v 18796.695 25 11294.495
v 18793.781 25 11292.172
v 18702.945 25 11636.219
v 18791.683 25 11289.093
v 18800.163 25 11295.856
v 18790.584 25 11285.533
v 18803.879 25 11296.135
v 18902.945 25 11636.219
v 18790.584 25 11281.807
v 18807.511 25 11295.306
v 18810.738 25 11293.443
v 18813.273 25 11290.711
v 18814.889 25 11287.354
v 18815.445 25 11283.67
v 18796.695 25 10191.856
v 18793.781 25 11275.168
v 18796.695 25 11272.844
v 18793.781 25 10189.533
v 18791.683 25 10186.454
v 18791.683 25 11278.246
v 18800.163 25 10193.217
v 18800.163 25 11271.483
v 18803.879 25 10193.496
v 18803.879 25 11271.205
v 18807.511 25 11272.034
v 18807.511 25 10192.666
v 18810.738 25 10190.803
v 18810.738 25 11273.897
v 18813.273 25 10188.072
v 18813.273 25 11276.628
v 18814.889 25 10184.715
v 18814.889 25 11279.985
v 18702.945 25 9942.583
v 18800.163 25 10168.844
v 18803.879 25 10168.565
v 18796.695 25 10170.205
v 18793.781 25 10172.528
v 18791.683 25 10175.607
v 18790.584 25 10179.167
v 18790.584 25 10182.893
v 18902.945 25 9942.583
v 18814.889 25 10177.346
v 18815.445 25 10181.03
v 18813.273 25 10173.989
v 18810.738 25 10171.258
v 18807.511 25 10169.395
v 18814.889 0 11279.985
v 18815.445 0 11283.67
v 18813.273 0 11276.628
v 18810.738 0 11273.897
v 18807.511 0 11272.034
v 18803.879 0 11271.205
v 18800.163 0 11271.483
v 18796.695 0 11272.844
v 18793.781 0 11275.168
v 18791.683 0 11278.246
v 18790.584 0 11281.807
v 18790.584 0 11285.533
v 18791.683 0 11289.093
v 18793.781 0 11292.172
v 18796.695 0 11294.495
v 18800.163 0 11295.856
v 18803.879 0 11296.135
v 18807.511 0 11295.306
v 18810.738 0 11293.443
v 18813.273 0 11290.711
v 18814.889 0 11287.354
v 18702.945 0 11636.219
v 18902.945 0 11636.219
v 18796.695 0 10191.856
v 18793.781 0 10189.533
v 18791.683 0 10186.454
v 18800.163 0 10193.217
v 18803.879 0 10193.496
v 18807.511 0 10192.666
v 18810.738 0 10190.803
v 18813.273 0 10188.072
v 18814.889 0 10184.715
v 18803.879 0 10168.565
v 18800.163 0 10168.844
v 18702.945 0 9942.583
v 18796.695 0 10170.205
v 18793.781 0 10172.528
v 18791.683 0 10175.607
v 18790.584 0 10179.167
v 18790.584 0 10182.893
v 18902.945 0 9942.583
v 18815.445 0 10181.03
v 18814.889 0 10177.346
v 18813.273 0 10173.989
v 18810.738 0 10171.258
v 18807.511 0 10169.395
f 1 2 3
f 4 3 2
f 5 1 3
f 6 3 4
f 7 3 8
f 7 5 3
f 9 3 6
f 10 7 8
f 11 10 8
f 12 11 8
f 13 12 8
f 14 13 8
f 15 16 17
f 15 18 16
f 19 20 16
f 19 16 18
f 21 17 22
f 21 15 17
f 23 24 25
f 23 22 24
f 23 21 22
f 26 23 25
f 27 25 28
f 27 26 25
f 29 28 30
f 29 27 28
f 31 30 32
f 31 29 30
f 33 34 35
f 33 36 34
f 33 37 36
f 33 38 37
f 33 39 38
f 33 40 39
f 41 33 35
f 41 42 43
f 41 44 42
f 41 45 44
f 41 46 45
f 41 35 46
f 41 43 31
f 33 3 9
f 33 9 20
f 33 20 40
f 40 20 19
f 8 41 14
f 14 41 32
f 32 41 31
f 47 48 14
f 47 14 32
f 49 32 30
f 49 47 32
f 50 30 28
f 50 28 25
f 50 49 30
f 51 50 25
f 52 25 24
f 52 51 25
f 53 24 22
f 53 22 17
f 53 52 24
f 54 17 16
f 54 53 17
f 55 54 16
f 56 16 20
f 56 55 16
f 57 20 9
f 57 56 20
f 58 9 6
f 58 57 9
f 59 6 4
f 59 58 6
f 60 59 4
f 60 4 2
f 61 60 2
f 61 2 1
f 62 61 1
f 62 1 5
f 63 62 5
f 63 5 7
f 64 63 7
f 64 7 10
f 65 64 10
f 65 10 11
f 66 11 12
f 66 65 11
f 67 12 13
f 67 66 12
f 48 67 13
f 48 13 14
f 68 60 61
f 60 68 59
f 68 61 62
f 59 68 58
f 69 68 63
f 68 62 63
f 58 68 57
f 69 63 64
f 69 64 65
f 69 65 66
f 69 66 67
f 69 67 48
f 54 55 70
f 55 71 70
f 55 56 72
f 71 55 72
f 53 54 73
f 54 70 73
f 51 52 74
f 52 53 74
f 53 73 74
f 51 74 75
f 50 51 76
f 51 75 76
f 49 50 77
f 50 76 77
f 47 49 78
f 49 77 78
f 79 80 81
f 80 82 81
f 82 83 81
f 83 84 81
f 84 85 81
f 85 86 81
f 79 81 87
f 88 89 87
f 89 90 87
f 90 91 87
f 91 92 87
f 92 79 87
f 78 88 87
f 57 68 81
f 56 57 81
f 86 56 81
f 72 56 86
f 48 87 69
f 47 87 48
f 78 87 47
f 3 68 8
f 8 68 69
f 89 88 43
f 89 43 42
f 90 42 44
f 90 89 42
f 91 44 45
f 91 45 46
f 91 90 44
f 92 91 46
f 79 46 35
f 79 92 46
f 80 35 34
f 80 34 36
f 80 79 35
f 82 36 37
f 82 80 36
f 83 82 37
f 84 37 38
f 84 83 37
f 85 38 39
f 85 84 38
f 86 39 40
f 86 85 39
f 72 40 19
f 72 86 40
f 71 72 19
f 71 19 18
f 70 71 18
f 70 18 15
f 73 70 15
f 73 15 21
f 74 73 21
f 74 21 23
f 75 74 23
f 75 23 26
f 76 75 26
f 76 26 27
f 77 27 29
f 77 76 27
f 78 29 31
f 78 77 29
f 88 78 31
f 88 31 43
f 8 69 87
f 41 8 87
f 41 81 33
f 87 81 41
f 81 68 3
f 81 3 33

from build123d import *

# Parameters (mm, degrees)
SKETCH4_W             = 200
SKETCH4_H             = 2933.573874127
SKETCH4_R             = 12.5
BOSS_EXTRUDE1_DEPTH   = 25
SKETCH4_H_2           = 2891.000919938
BOSS_EXTRUDE1_2_DEPTH = 25
SKETCH4_H_3           = 2656.8496719
BOSS_EXTRUDE1_3_DEPTH = 25
SKETCH4_H_4           = 2167.26069873
BOSS_EXTRUDE1_4_DEPTH = 25
SKETCH4_H_5           = 1693.636583381
BOSS_EXTRUDE1_5_DEPTH = 25
SKETCH5_W             = 6063.042757238
SKETCH5_H             = 4952.659926698
CUT_EXTRUDE1_DEPTH    = 26


with BuildPart() as part:
    # Sketch4 → Boss-Extrude1 (new body)
    with BuildSketch(Plane(origin=(0, 0, 0), x_dir=(1, 0, 0), z_dir=(0, 1, 0))):
        with Locations((23132.944645813, -11409.369811035)):
            Rectangle(SKETCH4_W, SKETCH4_H)
        with Locations((23132.944645813, -12678.089615367)):
            Circle(SKETCH4_R, mode=Mode.SUBTRACT)
        with Locations((23132.944645813, -10181.030459334)):
            Circle(SKETCH4_R, mode=Mode.SUBTRACT)
    extrude(amount=BOSS_EXTRUDE1_DEPTH)


with BuildPart() as body_2:
    # Sketch4 → Boss-Extrude1 2 (new body)
    with BuildSketch(Plane(origin=(0, 0, 0), x_dir=(1, 0, 0), z_dir=(0, 1, 0))):
        with Locations((22032.944645813, -11388.083333941)):
            Rectangle(SKETCH4_W, SKETCH4_H_2)
        with Locations((22032.944645813, -12621.228285175)):
            Circle(SKETCH4_R, mode=Mode.SUBTRACT)
        with Locations((22032.944645813, -10181.030459334)):
            Circle(SKETCH4_R, mode=Mode.SUBTRACT)
    extrude(amount=BOSS_EXTRUDE1_2_DEPTH)


with BuildPart() as body_3:
    # Sketch4 → Boss-Extrude1 3 (new body)
    with BuildSketch(Plane(origin=(0, 0, 0), x_dir=(1, 0, 0), z_dir=(0, 1, 0))):
        with Locations((20832.944645813, -11271.007709922)):
            Rectangle(SKETCH4_W, SKETCH4_H_3)
        with Locations((20832.944645813, -12348.754240871)):
            Circle(SKETCH4_R, mode=Mode.SUBTRACT)
        with Locations((20832.944645813, -10181.030459334)):
            Circle(SKETCH4_R, mode=Mode.SUBTRACT)
    extrude(amount=BOSS_EXTRUDE1_3_DEPTH)


with BuildPart() as body_4:
    # Sketch4 → Boss-Extrude1 4 (new body)
    with BuildSketch(Plane(origin=(0, 0, 0), x_dir=(1, 0, 0), z_dir=(0, 1, 0))):
        with Locations((19632.944645813, -11026.213223337)):
            Rectangle(SKETCH4_W, SKETCH4_H_4)
        with Locations((19632.944645813, -11826.915448153)):
            Circle(SKETCH4_R, mode=Mode.SUBTRACT)
        with Locations((19632.944645813, -10181.030459334)):
            Circle(SKETCH4_R, mode=Mode.SUBTRACT)
    extrude(amount=BOSS_EXTRUDE1_4_DEPTH)


with BuildPart() as body_5:
    # Sketch4 → Boss-Extrude1 5 (new body)
    with BuildSketch(Plane(origin=(0, 0, 0), x_dir=(1, 0, 0), z_dir=(0, 1, 0))):
        with Locations((18802.944645813, -10789.401165663)):
            Rectangle(SKETCH4_W, SKETCH4_H_5)
        with Locations((18802.944645813, -11283.669778774)):
            Circle(SKETCH4_R, mode=Mode.SUBTRACT)
        with Locations((18802.944645813, -10181.030459334)):
            Circle(SKETCH4_R, mode=Mode.SUBTRACT)
    extrude(amount=BOSS_EXTRUDE1_5_DEPTH)


with BuildPart() as cut_extrude1_tool:
    # Sketch5 → Cut-Extrude1 (new body, through all)
    with BuildSketch(Plane(origin=(0, 0, 0), x_dir=(1, 0, 0), z_dir=(0, 1, 0))):
        with Locations((22113.577724943, -11321.244189564)):
            Rectangle(SKETCH5_W, SKETCH5_H)
    extrude(amount=CUT_EXTRUDE1_DEPTH)


with BuildPart() as part_1:
    add(part.part)

    # Cut-Extrude1: cut by cut_extrude1_tool
    add(cut_extrude1_tool.part, mode=Mode.SUBTRACT)


with BuildPart() as body_2_1:
    add(body_2.part)

    # Cut-Extrude1: cut by cut_extrude1_tool
    add(cut_extrude1_tool.part, mode=Mode.SUBTRACT)


with BuildPart() as body_3_1:
    add(body_3.part)

    # Cut-Extrude1: cut by cut_extrude1_tool
    add(cut_extrude1_tool.part, mode=Mode.SUBTRACT)


with BuildPart() as body_4_1:
    add(body_4.part)

    # Cut-Extrude1: cut by cut_extrude1_tool
    add(cut_extrude1_tool.part, mode=Mode.SUBTRACT)


solid = body_5.part
